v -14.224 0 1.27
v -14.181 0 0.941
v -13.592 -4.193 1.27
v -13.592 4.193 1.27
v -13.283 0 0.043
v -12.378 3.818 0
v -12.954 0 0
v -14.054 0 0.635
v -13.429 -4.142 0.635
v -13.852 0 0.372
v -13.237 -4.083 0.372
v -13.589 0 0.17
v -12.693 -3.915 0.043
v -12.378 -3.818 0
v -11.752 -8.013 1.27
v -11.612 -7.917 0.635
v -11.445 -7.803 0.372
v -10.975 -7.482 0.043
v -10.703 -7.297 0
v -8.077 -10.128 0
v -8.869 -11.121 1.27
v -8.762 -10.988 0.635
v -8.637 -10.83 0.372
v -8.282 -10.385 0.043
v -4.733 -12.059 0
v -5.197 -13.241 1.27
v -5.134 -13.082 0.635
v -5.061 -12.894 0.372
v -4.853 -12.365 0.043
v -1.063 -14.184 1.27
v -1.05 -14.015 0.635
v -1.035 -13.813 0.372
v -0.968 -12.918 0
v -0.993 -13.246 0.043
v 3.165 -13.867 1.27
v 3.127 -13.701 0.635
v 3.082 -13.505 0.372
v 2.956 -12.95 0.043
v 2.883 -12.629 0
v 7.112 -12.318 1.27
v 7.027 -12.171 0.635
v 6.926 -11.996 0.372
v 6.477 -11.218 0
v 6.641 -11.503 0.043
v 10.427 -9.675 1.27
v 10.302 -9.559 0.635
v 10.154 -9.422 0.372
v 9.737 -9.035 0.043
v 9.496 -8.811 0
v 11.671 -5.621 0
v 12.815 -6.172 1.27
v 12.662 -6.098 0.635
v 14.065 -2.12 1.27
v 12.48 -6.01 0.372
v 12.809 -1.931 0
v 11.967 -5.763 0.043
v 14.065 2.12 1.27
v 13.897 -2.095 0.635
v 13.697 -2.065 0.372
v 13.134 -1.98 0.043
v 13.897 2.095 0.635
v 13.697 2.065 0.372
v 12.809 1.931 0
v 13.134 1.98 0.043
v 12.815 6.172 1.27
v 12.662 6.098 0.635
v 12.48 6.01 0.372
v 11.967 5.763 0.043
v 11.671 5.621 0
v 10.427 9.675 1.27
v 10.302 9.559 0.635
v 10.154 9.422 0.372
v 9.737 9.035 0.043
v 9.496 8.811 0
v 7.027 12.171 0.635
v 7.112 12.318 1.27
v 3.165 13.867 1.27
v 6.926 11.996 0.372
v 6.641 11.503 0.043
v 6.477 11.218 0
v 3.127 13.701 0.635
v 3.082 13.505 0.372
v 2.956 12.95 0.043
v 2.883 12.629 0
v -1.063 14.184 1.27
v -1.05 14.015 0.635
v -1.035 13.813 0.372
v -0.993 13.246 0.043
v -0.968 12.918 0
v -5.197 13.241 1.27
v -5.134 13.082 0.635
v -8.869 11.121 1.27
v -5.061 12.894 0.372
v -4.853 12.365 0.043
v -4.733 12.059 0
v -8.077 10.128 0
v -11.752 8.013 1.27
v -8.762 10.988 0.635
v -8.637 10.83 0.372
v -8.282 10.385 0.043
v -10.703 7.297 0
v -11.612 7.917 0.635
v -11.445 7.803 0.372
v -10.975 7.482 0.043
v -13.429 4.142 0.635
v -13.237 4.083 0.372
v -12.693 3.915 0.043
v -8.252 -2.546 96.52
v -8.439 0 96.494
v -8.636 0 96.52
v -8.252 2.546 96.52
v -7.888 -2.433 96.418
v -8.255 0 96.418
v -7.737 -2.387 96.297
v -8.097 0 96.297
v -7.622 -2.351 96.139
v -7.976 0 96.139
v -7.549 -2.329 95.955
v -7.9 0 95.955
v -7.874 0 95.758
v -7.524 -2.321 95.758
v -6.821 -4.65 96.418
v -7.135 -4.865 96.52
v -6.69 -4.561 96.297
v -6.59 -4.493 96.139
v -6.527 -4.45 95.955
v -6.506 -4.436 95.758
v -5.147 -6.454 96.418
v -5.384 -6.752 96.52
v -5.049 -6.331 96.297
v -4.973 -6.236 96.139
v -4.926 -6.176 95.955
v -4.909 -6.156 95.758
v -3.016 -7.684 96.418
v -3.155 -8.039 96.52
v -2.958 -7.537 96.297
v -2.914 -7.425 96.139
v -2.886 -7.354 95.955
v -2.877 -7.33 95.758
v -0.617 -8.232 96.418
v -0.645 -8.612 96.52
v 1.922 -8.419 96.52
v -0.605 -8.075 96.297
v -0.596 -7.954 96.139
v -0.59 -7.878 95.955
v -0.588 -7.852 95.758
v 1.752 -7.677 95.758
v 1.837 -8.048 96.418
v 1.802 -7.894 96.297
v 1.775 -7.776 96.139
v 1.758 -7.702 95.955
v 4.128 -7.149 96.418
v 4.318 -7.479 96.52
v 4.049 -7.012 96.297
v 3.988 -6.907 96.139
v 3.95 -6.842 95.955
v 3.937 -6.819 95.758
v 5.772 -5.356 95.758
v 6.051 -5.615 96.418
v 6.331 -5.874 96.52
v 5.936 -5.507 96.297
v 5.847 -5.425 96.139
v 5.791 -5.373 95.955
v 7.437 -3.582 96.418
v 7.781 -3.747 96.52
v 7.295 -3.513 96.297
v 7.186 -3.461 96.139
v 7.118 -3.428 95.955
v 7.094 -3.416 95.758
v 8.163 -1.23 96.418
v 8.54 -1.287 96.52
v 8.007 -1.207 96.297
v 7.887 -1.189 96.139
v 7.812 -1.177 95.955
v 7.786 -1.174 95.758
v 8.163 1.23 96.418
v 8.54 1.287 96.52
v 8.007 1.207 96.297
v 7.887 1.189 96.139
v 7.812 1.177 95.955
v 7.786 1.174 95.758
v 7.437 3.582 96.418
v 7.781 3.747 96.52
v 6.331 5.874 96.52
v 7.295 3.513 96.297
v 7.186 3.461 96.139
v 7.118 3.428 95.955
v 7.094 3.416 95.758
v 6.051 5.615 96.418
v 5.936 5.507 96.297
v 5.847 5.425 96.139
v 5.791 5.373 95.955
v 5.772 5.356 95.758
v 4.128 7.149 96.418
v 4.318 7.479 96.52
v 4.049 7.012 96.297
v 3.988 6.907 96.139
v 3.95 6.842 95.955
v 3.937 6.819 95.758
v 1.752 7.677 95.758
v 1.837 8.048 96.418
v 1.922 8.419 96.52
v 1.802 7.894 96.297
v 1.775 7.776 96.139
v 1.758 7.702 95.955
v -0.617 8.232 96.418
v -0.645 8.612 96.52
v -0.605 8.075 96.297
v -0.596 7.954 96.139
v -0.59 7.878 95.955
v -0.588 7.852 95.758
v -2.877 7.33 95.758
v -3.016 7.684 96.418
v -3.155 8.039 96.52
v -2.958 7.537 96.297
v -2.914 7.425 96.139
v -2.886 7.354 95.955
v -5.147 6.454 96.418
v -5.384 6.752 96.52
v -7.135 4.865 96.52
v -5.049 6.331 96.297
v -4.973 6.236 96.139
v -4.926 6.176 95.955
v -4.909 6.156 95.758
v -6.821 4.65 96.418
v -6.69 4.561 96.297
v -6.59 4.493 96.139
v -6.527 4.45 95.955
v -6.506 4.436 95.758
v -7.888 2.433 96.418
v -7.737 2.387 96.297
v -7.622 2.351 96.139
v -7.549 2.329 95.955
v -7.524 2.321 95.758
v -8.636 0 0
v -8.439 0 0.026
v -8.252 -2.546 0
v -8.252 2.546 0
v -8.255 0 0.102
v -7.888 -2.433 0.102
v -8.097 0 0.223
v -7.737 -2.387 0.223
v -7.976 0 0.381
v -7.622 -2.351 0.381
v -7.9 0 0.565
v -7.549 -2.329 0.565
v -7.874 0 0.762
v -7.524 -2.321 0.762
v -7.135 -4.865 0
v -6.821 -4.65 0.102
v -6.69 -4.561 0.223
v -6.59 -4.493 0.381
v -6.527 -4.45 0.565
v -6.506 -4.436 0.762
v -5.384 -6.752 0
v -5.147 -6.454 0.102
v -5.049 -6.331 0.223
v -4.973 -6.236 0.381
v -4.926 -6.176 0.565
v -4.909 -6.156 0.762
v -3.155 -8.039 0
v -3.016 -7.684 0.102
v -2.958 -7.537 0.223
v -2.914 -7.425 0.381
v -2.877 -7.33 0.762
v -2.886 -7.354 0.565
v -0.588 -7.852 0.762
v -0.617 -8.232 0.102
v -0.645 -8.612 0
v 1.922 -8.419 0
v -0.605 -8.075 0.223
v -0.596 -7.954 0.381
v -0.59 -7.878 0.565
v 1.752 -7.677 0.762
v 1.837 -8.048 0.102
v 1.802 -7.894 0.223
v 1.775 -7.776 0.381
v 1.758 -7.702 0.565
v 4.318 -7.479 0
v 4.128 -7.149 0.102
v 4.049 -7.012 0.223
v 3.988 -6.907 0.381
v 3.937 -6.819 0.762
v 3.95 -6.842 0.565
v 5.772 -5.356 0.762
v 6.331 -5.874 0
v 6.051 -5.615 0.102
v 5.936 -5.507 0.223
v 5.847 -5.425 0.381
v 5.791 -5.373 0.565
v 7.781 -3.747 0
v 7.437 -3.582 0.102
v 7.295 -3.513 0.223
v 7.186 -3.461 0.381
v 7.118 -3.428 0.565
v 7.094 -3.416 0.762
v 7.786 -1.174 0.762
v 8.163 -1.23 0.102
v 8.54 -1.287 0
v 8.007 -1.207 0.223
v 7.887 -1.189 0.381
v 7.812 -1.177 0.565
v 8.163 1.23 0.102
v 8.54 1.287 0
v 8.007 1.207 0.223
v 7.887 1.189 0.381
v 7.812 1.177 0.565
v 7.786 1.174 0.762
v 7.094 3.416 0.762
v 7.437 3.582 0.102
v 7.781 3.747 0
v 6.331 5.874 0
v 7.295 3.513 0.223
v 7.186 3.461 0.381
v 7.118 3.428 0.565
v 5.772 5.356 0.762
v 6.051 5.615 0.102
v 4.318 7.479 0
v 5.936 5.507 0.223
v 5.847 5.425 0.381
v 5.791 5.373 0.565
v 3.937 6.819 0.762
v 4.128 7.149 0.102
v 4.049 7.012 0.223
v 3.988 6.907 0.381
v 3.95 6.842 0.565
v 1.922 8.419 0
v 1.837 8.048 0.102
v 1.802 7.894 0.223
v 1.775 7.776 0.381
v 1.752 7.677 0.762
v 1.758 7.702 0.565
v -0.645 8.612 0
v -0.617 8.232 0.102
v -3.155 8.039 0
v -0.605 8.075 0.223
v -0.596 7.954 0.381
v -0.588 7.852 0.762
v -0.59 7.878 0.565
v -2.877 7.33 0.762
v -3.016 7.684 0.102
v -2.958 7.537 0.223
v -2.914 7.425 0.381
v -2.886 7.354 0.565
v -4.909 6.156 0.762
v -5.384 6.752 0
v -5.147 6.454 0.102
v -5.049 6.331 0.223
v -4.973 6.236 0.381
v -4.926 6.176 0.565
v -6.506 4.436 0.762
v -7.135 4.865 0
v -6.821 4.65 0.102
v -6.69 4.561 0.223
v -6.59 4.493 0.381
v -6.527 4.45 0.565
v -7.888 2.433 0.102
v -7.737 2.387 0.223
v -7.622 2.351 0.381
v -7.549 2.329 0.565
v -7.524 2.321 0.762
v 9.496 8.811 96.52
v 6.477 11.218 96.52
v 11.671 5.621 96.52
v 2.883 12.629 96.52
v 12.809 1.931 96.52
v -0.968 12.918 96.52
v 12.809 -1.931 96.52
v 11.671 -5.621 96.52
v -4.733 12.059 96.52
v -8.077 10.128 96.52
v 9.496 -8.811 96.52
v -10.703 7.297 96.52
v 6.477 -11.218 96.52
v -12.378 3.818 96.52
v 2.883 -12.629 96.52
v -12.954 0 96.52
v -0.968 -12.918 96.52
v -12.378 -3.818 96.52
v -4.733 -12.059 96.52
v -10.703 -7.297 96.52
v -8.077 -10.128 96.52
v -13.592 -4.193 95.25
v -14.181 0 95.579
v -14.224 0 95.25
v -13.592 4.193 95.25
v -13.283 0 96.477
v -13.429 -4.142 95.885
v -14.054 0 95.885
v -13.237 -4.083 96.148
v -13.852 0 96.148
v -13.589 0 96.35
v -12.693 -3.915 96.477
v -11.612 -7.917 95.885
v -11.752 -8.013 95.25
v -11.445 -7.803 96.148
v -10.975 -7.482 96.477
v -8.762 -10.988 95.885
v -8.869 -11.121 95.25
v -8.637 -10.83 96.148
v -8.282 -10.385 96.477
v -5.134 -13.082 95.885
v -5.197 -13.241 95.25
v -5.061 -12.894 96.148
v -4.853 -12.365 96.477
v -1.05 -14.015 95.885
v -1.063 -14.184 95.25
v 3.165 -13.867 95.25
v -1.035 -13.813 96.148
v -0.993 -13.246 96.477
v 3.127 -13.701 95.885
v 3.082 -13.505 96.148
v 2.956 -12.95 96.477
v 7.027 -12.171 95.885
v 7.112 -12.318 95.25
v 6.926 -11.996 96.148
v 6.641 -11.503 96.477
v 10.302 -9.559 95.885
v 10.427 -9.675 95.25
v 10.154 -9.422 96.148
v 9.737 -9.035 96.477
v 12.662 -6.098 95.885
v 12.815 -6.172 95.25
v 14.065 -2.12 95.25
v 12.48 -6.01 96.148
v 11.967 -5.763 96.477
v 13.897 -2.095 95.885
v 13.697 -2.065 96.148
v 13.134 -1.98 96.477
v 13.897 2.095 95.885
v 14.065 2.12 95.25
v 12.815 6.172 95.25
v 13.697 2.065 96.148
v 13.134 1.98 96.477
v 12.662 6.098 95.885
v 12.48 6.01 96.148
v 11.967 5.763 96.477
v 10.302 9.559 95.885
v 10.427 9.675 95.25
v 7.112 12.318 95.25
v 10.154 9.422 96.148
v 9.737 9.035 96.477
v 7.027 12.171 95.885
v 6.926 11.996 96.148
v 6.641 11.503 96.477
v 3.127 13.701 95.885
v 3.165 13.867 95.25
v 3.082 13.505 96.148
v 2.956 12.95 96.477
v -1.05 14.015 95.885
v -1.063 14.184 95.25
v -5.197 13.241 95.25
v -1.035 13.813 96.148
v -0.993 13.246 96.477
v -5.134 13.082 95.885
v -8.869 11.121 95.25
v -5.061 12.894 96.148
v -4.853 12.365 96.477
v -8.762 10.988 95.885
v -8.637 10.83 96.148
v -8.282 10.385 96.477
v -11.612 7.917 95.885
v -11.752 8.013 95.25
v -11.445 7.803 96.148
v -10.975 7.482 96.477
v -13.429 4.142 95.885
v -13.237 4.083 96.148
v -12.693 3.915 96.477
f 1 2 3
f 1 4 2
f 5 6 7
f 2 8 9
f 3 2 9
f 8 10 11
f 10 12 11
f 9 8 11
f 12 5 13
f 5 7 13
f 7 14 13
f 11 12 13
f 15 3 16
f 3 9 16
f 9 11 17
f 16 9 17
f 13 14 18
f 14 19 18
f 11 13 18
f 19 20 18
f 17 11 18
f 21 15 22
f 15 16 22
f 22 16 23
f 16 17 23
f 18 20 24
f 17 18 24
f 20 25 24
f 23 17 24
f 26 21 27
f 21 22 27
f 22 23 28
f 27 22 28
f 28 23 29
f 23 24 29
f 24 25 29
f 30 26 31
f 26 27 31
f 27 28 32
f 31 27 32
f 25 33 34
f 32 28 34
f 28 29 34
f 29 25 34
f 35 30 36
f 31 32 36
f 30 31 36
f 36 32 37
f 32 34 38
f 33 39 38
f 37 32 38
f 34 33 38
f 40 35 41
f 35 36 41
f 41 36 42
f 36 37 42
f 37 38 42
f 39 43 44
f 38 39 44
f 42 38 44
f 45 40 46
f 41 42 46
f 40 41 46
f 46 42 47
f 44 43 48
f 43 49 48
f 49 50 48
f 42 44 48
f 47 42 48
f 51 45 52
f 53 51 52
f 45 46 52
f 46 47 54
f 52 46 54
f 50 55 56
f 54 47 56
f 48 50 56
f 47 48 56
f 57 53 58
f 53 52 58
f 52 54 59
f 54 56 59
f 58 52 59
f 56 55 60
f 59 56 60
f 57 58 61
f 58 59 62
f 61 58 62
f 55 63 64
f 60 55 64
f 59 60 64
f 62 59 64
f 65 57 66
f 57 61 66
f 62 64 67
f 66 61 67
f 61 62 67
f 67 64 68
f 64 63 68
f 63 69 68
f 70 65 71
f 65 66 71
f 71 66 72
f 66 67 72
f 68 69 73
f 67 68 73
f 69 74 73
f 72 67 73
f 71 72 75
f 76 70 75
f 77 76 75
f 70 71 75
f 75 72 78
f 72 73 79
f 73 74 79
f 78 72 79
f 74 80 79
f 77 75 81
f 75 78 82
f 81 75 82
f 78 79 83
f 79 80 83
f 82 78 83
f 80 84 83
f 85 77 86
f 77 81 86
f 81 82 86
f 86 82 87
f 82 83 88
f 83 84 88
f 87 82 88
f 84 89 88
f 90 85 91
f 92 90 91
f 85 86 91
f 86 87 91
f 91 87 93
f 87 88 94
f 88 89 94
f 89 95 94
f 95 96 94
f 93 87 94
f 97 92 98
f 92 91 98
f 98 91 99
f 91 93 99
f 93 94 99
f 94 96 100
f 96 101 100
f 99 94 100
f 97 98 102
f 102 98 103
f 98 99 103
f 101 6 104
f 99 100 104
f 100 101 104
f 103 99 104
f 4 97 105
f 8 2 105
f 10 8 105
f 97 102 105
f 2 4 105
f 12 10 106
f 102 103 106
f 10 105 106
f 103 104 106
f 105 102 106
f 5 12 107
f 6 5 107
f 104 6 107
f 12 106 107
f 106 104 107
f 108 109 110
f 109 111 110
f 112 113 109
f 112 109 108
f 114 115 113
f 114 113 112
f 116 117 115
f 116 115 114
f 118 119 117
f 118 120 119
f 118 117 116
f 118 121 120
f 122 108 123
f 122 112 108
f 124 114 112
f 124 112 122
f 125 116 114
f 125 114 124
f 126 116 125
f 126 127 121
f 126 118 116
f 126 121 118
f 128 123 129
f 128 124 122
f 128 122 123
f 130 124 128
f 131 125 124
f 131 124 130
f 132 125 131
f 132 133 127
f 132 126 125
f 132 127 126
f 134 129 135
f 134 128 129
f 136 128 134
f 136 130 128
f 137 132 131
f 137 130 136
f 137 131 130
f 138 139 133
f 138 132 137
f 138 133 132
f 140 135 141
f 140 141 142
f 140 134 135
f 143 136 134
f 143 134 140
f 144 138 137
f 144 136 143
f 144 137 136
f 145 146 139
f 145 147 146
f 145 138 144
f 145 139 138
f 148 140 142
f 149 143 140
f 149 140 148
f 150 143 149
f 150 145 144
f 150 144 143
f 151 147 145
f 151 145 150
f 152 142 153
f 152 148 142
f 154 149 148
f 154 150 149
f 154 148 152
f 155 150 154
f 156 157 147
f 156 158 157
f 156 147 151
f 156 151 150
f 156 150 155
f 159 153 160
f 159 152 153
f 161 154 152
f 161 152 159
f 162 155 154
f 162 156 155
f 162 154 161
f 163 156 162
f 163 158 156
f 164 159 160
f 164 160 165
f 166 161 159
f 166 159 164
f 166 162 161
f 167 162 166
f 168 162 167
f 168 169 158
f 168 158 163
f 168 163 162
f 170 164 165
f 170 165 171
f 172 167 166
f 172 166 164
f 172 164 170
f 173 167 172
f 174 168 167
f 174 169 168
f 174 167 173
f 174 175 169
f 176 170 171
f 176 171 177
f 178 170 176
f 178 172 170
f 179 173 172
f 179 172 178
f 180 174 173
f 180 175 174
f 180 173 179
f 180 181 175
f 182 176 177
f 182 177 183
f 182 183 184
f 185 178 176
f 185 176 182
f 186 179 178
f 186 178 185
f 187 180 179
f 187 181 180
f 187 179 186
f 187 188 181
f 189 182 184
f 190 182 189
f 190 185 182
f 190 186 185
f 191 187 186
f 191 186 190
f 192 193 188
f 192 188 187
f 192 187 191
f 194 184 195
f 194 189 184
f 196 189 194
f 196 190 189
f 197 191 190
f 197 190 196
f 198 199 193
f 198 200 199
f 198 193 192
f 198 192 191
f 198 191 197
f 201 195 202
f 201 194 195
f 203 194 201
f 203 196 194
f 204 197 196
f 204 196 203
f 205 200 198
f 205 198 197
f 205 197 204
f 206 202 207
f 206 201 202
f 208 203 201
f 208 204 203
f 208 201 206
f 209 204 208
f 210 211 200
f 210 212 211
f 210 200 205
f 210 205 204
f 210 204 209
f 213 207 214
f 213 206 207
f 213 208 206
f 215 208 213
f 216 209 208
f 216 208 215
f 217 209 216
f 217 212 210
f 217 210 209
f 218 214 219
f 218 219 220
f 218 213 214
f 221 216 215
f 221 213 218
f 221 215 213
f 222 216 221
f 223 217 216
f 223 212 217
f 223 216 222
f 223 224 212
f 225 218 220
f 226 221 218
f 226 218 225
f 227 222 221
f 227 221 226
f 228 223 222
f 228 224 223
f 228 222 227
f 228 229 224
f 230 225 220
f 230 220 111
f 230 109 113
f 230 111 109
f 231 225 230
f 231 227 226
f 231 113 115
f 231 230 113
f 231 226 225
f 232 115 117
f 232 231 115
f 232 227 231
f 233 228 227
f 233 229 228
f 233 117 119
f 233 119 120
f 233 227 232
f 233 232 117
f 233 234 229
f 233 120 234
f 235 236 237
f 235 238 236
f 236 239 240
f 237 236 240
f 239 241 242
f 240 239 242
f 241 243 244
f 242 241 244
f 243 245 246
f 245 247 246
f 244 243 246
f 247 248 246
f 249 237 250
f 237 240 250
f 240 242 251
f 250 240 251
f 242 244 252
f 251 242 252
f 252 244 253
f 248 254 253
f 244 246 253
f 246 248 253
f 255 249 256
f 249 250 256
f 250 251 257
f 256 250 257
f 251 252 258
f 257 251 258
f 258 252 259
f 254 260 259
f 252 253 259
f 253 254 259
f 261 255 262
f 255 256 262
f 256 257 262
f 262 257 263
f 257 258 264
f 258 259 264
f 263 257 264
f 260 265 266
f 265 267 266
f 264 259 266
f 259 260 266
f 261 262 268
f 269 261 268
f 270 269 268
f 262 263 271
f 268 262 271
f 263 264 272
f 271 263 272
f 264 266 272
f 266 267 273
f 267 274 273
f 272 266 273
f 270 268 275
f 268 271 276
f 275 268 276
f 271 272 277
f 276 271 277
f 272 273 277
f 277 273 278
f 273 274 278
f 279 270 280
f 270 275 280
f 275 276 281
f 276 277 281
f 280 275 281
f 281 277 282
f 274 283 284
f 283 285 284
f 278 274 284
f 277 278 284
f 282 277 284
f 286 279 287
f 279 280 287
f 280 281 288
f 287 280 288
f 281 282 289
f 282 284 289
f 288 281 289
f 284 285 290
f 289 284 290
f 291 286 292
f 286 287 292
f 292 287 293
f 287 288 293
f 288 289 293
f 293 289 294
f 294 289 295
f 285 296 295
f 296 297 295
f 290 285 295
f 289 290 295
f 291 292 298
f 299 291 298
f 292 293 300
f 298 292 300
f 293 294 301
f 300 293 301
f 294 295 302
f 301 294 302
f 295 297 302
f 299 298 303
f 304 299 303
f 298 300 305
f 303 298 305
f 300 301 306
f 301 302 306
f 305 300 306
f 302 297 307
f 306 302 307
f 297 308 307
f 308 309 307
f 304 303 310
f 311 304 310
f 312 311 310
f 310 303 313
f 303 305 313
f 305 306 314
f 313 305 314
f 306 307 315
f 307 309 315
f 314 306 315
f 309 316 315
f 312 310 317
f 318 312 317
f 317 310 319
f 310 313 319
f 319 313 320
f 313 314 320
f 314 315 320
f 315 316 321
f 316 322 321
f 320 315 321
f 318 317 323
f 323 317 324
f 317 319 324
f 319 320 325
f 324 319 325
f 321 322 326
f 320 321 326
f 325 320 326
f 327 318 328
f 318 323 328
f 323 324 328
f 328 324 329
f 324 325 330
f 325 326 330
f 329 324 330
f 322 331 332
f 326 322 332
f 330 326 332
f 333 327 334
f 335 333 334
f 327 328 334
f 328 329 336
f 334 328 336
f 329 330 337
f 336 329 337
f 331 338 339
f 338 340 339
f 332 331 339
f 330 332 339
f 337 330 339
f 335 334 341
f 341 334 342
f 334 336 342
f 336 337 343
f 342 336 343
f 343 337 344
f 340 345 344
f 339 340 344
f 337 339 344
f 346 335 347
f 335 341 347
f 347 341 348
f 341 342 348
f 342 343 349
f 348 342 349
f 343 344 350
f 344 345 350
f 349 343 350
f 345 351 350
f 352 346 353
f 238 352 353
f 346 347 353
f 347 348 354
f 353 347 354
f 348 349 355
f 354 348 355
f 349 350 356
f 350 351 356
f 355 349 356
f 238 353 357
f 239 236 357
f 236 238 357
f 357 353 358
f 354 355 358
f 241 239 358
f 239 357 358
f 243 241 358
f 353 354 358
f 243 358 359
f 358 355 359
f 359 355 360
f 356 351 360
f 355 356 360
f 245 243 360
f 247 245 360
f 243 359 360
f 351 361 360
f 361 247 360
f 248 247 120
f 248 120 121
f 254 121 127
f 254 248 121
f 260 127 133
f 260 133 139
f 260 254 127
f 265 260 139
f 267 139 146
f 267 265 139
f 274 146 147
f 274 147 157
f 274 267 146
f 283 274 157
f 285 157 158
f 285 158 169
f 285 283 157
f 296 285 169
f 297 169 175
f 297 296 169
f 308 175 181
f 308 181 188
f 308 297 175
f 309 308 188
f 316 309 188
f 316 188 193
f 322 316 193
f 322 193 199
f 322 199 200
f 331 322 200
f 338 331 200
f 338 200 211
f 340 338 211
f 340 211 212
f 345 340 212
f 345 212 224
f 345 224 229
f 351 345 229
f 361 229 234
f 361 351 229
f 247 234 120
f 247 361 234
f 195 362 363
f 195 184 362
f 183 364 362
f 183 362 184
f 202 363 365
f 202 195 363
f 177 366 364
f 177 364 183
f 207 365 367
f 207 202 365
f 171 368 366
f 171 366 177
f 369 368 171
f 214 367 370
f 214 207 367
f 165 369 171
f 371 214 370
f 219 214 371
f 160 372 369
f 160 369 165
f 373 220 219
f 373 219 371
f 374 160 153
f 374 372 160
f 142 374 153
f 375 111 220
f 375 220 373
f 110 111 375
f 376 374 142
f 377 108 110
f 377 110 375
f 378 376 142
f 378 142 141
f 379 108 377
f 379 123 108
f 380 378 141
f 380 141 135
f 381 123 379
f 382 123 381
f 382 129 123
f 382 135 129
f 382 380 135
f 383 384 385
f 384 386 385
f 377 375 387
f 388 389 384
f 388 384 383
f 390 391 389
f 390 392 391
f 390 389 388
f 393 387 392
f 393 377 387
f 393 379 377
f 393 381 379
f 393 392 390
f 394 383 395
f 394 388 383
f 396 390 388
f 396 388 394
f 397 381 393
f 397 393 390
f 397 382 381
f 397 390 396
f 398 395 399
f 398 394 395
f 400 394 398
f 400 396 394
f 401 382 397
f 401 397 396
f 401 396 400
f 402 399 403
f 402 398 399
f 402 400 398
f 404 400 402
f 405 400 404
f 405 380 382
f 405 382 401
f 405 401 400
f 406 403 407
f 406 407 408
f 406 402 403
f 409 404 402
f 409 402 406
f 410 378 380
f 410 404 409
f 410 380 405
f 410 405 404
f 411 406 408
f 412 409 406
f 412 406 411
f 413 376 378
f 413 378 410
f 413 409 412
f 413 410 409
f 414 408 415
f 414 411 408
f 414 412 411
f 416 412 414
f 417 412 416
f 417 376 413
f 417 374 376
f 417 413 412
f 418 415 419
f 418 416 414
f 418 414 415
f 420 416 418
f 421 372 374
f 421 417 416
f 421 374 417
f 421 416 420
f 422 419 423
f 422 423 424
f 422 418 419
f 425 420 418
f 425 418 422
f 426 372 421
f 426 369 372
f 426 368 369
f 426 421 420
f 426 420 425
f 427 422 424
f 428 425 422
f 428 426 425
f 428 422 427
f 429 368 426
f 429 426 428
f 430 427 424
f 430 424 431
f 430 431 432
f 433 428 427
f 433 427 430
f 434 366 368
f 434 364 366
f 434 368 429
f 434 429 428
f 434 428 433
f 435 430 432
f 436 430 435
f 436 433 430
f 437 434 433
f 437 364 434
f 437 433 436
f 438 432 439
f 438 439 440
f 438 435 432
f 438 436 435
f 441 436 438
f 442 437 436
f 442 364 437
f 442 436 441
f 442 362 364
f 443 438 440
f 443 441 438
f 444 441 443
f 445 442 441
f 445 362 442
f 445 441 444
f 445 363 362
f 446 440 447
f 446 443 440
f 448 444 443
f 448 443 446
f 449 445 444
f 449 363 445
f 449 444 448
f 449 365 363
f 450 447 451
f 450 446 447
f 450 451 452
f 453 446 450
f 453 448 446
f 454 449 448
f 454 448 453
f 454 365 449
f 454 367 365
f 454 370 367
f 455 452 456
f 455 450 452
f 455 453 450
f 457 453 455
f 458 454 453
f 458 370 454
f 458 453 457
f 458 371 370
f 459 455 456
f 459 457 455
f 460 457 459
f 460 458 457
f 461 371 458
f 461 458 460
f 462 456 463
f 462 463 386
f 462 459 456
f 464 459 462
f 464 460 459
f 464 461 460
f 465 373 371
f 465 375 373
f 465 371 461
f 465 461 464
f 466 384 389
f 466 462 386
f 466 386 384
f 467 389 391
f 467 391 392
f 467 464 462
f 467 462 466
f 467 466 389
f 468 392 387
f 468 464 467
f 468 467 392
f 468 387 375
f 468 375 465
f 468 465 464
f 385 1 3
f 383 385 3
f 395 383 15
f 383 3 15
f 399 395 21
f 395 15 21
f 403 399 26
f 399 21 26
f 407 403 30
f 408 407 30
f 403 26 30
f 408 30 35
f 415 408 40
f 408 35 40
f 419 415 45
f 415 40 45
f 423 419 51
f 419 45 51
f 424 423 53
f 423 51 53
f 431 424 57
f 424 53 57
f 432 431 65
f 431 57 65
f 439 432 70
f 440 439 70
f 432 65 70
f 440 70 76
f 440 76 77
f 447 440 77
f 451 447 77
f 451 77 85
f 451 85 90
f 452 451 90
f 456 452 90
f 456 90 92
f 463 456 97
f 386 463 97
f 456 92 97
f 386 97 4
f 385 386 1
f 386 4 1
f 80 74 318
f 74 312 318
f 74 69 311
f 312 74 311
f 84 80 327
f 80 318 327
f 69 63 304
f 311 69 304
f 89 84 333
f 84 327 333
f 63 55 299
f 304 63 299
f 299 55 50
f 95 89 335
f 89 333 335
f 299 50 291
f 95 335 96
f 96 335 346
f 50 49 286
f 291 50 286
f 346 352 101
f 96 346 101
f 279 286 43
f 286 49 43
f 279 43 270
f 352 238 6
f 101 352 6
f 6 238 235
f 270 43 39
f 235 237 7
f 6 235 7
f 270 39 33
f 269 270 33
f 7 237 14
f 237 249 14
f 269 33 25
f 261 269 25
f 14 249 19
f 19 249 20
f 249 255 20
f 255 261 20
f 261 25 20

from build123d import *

# Parameters (mm, degrees)
SKETCH1_R           = 14.224
SKETCH1_R_2         = 7.874
BOSS_EXTRUDE1_DEPTH = 96.52
FILLET1_R           = 1.27
FILLET2_R           = 0.762


with BuildPart() as part:
    # Sketch1 → Boss-Extrude1 (new body)
    with BuildSketch(Plane.XY):
        with Locations(Location((0, 0, 0), (0, 0, 180))):
            Circle(SKETCH1_R)
        with Locations(Location((0, 0, 0), (0, 0, 180))):
            Circle(SKETCH1_R_2, mode=Mode.SUBTRACT)
    extrude(amount=BOSS_EXTRUDE1_DEPTH)

    # Fillet1
    fillet1_edges = [part.edges().sort_by_distance(p)[0] for p in [
        (14.224, 0, 0),
        (14.224, 0, 96.52),
    ]]
    fillet(fillet1_edges, radius=FILLET1_R)

    # Fillet2
    fillet2_edges = [part.edges().sort_by_distance(p)[0] for p in [
        (7.874, 0, 0),
        (7.874, 0, 96.52),
    ]]
    fillet(fillet2_edges, radius=FILLET2_R)


solid = part.part
